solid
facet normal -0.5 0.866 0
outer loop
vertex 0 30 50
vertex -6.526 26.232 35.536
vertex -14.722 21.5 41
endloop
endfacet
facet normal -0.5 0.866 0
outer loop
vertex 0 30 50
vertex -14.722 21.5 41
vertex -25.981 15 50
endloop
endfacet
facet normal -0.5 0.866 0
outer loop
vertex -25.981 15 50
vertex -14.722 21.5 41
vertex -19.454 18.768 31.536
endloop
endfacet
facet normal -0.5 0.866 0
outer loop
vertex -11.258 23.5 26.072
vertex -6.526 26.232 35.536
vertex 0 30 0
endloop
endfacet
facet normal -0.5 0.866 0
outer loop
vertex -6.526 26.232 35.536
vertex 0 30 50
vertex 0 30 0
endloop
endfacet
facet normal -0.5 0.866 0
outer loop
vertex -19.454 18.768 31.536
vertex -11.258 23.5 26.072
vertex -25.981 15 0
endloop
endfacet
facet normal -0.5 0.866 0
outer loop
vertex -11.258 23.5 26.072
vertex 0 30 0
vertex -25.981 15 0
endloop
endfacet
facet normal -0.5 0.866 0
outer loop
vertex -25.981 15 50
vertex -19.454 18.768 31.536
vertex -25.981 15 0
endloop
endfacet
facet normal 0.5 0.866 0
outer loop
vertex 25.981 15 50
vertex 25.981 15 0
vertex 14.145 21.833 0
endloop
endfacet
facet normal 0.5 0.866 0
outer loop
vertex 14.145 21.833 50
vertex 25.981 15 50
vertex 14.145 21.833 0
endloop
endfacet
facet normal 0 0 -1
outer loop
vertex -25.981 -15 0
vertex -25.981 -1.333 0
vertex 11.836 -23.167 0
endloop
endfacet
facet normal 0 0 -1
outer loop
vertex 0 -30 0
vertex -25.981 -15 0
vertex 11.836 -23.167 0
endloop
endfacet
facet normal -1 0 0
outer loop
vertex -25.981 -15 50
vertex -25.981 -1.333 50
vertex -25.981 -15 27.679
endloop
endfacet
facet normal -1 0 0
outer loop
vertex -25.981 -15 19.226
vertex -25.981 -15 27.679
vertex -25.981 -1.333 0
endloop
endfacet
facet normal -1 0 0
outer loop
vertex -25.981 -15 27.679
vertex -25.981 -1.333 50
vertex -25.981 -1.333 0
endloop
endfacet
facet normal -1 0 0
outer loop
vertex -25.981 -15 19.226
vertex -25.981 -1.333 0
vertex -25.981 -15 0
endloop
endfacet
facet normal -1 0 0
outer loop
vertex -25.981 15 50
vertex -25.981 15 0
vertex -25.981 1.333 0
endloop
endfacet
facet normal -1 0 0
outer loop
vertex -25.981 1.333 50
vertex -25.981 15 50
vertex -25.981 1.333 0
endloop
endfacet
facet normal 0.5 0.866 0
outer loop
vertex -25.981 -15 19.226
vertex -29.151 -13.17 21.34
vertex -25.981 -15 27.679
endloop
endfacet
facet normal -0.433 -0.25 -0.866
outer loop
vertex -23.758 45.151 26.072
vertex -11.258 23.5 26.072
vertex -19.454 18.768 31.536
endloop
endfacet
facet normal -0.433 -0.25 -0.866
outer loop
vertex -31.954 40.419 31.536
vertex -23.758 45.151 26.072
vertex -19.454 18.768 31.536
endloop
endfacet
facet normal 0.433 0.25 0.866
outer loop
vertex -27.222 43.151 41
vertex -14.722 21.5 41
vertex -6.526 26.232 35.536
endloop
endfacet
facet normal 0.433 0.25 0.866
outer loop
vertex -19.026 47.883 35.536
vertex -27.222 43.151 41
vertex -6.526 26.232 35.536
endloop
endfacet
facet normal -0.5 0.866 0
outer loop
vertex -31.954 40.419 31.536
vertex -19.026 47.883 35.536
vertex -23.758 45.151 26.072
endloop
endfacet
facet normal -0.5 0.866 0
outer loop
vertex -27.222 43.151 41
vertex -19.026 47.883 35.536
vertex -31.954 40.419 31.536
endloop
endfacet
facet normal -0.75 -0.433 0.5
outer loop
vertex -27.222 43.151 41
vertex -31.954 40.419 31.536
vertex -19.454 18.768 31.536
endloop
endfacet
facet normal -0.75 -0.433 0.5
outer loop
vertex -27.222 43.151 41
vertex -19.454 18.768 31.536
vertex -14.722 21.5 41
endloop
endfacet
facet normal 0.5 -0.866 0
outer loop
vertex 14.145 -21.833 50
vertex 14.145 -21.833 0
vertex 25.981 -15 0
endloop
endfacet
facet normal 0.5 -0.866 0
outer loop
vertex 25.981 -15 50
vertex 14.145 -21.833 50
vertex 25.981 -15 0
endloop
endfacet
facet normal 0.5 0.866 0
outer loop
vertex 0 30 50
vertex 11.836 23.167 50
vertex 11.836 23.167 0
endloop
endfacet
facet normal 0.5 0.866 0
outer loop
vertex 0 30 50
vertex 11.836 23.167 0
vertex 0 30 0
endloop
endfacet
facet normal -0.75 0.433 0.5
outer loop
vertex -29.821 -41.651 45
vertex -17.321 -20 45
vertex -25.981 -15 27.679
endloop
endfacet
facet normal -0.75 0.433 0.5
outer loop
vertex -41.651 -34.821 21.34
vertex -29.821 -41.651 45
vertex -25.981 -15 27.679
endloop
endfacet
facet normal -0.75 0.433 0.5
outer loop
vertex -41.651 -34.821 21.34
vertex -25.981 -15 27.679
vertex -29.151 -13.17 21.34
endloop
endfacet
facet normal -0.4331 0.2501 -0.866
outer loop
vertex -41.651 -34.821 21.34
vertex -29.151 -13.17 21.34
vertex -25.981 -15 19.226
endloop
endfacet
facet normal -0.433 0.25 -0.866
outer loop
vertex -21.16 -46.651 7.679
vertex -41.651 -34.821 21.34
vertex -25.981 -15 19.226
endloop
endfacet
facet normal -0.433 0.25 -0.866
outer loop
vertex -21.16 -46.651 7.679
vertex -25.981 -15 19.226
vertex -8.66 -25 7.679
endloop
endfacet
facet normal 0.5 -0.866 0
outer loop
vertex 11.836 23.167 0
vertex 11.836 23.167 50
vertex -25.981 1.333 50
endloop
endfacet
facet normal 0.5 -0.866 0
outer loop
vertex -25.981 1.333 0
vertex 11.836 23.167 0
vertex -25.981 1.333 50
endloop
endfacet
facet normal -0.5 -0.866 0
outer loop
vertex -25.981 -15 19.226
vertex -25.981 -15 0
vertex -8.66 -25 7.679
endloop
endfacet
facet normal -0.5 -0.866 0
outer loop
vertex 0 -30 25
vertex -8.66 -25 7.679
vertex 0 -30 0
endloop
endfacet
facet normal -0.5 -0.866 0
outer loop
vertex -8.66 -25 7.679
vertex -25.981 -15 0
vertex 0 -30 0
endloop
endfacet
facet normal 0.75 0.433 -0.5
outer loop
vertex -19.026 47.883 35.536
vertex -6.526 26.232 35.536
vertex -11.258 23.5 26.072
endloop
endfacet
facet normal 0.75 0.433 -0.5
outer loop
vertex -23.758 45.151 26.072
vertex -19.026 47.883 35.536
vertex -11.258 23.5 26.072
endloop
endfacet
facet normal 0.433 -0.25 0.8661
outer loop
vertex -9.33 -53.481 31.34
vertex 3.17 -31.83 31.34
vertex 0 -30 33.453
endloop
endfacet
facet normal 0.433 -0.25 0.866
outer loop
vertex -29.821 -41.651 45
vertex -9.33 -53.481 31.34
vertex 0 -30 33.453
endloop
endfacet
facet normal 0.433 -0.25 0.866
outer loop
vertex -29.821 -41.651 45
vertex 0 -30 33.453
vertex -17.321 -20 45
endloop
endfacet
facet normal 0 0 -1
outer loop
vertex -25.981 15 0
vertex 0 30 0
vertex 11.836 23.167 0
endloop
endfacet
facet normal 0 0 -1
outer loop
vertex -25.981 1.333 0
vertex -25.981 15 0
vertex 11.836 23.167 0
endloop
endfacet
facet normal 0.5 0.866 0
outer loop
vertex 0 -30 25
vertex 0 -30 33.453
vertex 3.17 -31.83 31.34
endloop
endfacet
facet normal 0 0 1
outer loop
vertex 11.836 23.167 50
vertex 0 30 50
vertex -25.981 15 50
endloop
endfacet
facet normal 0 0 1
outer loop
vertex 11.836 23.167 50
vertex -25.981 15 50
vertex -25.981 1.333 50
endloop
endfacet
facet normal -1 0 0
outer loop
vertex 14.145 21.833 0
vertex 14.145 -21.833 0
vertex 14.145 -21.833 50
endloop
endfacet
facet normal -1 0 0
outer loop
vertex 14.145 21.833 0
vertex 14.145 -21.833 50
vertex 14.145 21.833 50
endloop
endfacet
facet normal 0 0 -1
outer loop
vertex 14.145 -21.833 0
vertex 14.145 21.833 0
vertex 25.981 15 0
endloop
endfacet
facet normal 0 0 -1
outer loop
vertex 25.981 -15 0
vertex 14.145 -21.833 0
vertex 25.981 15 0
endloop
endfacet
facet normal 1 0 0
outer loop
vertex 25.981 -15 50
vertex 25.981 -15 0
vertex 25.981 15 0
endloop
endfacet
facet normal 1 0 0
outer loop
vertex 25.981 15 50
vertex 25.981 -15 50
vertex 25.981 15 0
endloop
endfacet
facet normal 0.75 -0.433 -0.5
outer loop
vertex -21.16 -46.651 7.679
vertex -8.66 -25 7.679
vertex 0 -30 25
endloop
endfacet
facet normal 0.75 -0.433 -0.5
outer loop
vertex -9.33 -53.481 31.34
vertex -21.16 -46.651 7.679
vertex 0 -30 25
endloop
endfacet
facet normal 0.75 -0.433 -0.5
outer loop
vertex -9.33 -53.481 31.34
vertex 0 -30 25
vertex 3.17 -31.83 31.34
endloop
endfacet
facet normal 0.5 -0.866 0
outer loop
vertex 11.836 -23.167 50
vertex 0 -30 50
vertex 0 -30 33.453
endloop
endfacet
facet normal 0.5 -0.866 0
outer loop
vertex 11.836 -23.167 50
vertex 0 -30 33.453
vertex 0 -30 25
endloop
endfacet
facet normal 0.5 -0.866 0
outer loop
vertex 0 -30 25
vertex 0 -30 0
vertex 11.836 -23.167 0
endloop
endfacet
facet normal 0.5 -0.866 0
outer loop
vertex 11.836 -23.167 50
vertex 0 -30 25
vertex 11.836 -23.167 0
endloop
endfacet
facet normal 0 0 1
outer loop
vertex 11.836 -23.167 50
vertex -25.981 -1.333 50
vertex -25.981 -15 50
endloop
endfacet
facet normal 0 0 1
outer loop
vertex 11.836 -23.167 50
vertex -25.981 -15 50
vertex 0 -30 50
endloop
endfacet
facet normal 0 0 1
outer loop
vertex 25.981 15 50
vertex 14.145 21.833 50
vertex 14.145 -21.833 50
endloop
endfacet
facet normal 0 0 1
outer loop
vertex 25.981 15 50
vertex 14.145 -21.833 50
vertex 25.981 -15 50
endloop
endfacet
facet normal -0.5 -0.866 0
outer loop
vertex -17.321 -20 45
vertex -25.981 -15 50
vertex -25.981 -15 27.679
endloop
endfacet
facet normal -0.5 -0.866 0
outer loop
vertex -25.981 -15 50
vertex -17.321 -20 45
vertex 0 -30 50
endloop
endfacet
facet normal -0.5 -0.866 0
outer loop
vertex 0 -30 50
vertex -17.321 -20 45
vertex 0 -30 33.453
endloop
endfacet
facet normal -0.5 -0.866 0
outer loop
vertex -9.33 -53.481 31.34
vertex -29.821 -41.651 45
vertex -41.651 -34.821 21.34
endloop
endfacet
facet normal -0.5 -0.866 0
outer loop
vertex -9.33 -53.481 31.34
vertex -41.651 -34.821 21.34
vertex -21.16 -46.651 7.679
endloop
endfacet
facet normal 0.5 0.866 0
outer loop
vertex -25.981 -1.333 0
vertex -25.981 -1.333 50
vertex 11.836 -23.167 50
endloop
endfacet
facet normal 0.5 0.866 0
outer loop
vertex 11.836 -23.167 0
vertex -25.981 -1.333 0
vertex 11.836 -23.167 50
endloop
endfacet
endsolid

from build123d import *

# Parameters (mm, degrees)
F1_DEPTH = 50
F3_DEPTH = 50
F5_DEPTH = 25
F7_DEPTH = 25


with BuildPart() as f1:
    # F0 (on Top) → F1 (new body)
    with BuildSketch(Plane.XY):
        Polygon((-25.9807621135, 15), (-25.9807621135, -15), (0, -30), (25.9807621135, -15), (25.9807621135, 15), (0, 30), align=None)
    extrude(amount=F1_DEPTH)

    # F2 (on face) → F3 (cut)
    with BuildSketch(Plane.XY.offset(50)):
        Polygon((14.1450815951, 24.5), (-28.2901631903, 0), (14.1450815951, -24.5), align=None)
    extrude(amount=-F3_DEPTH, mode=Mode.SUBTRACT)

    # F4 (on face) → F5 (join)
    with BuildSketch(Plane(origin=(-12.9903810568, -22.5, 0), x_dir=(0.8660254038, -0.5, 0), z_dir=(-0.5, -0.8660254038, 0))):
        Polygon((-5, 45), (-18.6602540378, 21.3397459622), (5, 7.6794919243), (18.6602540378, 31.3397459622), align=None)
    extrude(amount=F5_DEPTH)

    # F6 (on face) → F7 (join)
    with BuildSketch(Plane(origin=(-12.9903810568, 22.5, 0), x_dir=(-0.8660254038, -0.5, 0), z_dir=(-0.5, 0.8660254038, 0))):
        Polygon((-2, 26.0717967697), (7.4641016151, 31.5358983849), (2, 41), (-7.4641016151, 35.5358983849), align=None)
    extrude(amount=F7_DEPTH)


solid = f1.part
